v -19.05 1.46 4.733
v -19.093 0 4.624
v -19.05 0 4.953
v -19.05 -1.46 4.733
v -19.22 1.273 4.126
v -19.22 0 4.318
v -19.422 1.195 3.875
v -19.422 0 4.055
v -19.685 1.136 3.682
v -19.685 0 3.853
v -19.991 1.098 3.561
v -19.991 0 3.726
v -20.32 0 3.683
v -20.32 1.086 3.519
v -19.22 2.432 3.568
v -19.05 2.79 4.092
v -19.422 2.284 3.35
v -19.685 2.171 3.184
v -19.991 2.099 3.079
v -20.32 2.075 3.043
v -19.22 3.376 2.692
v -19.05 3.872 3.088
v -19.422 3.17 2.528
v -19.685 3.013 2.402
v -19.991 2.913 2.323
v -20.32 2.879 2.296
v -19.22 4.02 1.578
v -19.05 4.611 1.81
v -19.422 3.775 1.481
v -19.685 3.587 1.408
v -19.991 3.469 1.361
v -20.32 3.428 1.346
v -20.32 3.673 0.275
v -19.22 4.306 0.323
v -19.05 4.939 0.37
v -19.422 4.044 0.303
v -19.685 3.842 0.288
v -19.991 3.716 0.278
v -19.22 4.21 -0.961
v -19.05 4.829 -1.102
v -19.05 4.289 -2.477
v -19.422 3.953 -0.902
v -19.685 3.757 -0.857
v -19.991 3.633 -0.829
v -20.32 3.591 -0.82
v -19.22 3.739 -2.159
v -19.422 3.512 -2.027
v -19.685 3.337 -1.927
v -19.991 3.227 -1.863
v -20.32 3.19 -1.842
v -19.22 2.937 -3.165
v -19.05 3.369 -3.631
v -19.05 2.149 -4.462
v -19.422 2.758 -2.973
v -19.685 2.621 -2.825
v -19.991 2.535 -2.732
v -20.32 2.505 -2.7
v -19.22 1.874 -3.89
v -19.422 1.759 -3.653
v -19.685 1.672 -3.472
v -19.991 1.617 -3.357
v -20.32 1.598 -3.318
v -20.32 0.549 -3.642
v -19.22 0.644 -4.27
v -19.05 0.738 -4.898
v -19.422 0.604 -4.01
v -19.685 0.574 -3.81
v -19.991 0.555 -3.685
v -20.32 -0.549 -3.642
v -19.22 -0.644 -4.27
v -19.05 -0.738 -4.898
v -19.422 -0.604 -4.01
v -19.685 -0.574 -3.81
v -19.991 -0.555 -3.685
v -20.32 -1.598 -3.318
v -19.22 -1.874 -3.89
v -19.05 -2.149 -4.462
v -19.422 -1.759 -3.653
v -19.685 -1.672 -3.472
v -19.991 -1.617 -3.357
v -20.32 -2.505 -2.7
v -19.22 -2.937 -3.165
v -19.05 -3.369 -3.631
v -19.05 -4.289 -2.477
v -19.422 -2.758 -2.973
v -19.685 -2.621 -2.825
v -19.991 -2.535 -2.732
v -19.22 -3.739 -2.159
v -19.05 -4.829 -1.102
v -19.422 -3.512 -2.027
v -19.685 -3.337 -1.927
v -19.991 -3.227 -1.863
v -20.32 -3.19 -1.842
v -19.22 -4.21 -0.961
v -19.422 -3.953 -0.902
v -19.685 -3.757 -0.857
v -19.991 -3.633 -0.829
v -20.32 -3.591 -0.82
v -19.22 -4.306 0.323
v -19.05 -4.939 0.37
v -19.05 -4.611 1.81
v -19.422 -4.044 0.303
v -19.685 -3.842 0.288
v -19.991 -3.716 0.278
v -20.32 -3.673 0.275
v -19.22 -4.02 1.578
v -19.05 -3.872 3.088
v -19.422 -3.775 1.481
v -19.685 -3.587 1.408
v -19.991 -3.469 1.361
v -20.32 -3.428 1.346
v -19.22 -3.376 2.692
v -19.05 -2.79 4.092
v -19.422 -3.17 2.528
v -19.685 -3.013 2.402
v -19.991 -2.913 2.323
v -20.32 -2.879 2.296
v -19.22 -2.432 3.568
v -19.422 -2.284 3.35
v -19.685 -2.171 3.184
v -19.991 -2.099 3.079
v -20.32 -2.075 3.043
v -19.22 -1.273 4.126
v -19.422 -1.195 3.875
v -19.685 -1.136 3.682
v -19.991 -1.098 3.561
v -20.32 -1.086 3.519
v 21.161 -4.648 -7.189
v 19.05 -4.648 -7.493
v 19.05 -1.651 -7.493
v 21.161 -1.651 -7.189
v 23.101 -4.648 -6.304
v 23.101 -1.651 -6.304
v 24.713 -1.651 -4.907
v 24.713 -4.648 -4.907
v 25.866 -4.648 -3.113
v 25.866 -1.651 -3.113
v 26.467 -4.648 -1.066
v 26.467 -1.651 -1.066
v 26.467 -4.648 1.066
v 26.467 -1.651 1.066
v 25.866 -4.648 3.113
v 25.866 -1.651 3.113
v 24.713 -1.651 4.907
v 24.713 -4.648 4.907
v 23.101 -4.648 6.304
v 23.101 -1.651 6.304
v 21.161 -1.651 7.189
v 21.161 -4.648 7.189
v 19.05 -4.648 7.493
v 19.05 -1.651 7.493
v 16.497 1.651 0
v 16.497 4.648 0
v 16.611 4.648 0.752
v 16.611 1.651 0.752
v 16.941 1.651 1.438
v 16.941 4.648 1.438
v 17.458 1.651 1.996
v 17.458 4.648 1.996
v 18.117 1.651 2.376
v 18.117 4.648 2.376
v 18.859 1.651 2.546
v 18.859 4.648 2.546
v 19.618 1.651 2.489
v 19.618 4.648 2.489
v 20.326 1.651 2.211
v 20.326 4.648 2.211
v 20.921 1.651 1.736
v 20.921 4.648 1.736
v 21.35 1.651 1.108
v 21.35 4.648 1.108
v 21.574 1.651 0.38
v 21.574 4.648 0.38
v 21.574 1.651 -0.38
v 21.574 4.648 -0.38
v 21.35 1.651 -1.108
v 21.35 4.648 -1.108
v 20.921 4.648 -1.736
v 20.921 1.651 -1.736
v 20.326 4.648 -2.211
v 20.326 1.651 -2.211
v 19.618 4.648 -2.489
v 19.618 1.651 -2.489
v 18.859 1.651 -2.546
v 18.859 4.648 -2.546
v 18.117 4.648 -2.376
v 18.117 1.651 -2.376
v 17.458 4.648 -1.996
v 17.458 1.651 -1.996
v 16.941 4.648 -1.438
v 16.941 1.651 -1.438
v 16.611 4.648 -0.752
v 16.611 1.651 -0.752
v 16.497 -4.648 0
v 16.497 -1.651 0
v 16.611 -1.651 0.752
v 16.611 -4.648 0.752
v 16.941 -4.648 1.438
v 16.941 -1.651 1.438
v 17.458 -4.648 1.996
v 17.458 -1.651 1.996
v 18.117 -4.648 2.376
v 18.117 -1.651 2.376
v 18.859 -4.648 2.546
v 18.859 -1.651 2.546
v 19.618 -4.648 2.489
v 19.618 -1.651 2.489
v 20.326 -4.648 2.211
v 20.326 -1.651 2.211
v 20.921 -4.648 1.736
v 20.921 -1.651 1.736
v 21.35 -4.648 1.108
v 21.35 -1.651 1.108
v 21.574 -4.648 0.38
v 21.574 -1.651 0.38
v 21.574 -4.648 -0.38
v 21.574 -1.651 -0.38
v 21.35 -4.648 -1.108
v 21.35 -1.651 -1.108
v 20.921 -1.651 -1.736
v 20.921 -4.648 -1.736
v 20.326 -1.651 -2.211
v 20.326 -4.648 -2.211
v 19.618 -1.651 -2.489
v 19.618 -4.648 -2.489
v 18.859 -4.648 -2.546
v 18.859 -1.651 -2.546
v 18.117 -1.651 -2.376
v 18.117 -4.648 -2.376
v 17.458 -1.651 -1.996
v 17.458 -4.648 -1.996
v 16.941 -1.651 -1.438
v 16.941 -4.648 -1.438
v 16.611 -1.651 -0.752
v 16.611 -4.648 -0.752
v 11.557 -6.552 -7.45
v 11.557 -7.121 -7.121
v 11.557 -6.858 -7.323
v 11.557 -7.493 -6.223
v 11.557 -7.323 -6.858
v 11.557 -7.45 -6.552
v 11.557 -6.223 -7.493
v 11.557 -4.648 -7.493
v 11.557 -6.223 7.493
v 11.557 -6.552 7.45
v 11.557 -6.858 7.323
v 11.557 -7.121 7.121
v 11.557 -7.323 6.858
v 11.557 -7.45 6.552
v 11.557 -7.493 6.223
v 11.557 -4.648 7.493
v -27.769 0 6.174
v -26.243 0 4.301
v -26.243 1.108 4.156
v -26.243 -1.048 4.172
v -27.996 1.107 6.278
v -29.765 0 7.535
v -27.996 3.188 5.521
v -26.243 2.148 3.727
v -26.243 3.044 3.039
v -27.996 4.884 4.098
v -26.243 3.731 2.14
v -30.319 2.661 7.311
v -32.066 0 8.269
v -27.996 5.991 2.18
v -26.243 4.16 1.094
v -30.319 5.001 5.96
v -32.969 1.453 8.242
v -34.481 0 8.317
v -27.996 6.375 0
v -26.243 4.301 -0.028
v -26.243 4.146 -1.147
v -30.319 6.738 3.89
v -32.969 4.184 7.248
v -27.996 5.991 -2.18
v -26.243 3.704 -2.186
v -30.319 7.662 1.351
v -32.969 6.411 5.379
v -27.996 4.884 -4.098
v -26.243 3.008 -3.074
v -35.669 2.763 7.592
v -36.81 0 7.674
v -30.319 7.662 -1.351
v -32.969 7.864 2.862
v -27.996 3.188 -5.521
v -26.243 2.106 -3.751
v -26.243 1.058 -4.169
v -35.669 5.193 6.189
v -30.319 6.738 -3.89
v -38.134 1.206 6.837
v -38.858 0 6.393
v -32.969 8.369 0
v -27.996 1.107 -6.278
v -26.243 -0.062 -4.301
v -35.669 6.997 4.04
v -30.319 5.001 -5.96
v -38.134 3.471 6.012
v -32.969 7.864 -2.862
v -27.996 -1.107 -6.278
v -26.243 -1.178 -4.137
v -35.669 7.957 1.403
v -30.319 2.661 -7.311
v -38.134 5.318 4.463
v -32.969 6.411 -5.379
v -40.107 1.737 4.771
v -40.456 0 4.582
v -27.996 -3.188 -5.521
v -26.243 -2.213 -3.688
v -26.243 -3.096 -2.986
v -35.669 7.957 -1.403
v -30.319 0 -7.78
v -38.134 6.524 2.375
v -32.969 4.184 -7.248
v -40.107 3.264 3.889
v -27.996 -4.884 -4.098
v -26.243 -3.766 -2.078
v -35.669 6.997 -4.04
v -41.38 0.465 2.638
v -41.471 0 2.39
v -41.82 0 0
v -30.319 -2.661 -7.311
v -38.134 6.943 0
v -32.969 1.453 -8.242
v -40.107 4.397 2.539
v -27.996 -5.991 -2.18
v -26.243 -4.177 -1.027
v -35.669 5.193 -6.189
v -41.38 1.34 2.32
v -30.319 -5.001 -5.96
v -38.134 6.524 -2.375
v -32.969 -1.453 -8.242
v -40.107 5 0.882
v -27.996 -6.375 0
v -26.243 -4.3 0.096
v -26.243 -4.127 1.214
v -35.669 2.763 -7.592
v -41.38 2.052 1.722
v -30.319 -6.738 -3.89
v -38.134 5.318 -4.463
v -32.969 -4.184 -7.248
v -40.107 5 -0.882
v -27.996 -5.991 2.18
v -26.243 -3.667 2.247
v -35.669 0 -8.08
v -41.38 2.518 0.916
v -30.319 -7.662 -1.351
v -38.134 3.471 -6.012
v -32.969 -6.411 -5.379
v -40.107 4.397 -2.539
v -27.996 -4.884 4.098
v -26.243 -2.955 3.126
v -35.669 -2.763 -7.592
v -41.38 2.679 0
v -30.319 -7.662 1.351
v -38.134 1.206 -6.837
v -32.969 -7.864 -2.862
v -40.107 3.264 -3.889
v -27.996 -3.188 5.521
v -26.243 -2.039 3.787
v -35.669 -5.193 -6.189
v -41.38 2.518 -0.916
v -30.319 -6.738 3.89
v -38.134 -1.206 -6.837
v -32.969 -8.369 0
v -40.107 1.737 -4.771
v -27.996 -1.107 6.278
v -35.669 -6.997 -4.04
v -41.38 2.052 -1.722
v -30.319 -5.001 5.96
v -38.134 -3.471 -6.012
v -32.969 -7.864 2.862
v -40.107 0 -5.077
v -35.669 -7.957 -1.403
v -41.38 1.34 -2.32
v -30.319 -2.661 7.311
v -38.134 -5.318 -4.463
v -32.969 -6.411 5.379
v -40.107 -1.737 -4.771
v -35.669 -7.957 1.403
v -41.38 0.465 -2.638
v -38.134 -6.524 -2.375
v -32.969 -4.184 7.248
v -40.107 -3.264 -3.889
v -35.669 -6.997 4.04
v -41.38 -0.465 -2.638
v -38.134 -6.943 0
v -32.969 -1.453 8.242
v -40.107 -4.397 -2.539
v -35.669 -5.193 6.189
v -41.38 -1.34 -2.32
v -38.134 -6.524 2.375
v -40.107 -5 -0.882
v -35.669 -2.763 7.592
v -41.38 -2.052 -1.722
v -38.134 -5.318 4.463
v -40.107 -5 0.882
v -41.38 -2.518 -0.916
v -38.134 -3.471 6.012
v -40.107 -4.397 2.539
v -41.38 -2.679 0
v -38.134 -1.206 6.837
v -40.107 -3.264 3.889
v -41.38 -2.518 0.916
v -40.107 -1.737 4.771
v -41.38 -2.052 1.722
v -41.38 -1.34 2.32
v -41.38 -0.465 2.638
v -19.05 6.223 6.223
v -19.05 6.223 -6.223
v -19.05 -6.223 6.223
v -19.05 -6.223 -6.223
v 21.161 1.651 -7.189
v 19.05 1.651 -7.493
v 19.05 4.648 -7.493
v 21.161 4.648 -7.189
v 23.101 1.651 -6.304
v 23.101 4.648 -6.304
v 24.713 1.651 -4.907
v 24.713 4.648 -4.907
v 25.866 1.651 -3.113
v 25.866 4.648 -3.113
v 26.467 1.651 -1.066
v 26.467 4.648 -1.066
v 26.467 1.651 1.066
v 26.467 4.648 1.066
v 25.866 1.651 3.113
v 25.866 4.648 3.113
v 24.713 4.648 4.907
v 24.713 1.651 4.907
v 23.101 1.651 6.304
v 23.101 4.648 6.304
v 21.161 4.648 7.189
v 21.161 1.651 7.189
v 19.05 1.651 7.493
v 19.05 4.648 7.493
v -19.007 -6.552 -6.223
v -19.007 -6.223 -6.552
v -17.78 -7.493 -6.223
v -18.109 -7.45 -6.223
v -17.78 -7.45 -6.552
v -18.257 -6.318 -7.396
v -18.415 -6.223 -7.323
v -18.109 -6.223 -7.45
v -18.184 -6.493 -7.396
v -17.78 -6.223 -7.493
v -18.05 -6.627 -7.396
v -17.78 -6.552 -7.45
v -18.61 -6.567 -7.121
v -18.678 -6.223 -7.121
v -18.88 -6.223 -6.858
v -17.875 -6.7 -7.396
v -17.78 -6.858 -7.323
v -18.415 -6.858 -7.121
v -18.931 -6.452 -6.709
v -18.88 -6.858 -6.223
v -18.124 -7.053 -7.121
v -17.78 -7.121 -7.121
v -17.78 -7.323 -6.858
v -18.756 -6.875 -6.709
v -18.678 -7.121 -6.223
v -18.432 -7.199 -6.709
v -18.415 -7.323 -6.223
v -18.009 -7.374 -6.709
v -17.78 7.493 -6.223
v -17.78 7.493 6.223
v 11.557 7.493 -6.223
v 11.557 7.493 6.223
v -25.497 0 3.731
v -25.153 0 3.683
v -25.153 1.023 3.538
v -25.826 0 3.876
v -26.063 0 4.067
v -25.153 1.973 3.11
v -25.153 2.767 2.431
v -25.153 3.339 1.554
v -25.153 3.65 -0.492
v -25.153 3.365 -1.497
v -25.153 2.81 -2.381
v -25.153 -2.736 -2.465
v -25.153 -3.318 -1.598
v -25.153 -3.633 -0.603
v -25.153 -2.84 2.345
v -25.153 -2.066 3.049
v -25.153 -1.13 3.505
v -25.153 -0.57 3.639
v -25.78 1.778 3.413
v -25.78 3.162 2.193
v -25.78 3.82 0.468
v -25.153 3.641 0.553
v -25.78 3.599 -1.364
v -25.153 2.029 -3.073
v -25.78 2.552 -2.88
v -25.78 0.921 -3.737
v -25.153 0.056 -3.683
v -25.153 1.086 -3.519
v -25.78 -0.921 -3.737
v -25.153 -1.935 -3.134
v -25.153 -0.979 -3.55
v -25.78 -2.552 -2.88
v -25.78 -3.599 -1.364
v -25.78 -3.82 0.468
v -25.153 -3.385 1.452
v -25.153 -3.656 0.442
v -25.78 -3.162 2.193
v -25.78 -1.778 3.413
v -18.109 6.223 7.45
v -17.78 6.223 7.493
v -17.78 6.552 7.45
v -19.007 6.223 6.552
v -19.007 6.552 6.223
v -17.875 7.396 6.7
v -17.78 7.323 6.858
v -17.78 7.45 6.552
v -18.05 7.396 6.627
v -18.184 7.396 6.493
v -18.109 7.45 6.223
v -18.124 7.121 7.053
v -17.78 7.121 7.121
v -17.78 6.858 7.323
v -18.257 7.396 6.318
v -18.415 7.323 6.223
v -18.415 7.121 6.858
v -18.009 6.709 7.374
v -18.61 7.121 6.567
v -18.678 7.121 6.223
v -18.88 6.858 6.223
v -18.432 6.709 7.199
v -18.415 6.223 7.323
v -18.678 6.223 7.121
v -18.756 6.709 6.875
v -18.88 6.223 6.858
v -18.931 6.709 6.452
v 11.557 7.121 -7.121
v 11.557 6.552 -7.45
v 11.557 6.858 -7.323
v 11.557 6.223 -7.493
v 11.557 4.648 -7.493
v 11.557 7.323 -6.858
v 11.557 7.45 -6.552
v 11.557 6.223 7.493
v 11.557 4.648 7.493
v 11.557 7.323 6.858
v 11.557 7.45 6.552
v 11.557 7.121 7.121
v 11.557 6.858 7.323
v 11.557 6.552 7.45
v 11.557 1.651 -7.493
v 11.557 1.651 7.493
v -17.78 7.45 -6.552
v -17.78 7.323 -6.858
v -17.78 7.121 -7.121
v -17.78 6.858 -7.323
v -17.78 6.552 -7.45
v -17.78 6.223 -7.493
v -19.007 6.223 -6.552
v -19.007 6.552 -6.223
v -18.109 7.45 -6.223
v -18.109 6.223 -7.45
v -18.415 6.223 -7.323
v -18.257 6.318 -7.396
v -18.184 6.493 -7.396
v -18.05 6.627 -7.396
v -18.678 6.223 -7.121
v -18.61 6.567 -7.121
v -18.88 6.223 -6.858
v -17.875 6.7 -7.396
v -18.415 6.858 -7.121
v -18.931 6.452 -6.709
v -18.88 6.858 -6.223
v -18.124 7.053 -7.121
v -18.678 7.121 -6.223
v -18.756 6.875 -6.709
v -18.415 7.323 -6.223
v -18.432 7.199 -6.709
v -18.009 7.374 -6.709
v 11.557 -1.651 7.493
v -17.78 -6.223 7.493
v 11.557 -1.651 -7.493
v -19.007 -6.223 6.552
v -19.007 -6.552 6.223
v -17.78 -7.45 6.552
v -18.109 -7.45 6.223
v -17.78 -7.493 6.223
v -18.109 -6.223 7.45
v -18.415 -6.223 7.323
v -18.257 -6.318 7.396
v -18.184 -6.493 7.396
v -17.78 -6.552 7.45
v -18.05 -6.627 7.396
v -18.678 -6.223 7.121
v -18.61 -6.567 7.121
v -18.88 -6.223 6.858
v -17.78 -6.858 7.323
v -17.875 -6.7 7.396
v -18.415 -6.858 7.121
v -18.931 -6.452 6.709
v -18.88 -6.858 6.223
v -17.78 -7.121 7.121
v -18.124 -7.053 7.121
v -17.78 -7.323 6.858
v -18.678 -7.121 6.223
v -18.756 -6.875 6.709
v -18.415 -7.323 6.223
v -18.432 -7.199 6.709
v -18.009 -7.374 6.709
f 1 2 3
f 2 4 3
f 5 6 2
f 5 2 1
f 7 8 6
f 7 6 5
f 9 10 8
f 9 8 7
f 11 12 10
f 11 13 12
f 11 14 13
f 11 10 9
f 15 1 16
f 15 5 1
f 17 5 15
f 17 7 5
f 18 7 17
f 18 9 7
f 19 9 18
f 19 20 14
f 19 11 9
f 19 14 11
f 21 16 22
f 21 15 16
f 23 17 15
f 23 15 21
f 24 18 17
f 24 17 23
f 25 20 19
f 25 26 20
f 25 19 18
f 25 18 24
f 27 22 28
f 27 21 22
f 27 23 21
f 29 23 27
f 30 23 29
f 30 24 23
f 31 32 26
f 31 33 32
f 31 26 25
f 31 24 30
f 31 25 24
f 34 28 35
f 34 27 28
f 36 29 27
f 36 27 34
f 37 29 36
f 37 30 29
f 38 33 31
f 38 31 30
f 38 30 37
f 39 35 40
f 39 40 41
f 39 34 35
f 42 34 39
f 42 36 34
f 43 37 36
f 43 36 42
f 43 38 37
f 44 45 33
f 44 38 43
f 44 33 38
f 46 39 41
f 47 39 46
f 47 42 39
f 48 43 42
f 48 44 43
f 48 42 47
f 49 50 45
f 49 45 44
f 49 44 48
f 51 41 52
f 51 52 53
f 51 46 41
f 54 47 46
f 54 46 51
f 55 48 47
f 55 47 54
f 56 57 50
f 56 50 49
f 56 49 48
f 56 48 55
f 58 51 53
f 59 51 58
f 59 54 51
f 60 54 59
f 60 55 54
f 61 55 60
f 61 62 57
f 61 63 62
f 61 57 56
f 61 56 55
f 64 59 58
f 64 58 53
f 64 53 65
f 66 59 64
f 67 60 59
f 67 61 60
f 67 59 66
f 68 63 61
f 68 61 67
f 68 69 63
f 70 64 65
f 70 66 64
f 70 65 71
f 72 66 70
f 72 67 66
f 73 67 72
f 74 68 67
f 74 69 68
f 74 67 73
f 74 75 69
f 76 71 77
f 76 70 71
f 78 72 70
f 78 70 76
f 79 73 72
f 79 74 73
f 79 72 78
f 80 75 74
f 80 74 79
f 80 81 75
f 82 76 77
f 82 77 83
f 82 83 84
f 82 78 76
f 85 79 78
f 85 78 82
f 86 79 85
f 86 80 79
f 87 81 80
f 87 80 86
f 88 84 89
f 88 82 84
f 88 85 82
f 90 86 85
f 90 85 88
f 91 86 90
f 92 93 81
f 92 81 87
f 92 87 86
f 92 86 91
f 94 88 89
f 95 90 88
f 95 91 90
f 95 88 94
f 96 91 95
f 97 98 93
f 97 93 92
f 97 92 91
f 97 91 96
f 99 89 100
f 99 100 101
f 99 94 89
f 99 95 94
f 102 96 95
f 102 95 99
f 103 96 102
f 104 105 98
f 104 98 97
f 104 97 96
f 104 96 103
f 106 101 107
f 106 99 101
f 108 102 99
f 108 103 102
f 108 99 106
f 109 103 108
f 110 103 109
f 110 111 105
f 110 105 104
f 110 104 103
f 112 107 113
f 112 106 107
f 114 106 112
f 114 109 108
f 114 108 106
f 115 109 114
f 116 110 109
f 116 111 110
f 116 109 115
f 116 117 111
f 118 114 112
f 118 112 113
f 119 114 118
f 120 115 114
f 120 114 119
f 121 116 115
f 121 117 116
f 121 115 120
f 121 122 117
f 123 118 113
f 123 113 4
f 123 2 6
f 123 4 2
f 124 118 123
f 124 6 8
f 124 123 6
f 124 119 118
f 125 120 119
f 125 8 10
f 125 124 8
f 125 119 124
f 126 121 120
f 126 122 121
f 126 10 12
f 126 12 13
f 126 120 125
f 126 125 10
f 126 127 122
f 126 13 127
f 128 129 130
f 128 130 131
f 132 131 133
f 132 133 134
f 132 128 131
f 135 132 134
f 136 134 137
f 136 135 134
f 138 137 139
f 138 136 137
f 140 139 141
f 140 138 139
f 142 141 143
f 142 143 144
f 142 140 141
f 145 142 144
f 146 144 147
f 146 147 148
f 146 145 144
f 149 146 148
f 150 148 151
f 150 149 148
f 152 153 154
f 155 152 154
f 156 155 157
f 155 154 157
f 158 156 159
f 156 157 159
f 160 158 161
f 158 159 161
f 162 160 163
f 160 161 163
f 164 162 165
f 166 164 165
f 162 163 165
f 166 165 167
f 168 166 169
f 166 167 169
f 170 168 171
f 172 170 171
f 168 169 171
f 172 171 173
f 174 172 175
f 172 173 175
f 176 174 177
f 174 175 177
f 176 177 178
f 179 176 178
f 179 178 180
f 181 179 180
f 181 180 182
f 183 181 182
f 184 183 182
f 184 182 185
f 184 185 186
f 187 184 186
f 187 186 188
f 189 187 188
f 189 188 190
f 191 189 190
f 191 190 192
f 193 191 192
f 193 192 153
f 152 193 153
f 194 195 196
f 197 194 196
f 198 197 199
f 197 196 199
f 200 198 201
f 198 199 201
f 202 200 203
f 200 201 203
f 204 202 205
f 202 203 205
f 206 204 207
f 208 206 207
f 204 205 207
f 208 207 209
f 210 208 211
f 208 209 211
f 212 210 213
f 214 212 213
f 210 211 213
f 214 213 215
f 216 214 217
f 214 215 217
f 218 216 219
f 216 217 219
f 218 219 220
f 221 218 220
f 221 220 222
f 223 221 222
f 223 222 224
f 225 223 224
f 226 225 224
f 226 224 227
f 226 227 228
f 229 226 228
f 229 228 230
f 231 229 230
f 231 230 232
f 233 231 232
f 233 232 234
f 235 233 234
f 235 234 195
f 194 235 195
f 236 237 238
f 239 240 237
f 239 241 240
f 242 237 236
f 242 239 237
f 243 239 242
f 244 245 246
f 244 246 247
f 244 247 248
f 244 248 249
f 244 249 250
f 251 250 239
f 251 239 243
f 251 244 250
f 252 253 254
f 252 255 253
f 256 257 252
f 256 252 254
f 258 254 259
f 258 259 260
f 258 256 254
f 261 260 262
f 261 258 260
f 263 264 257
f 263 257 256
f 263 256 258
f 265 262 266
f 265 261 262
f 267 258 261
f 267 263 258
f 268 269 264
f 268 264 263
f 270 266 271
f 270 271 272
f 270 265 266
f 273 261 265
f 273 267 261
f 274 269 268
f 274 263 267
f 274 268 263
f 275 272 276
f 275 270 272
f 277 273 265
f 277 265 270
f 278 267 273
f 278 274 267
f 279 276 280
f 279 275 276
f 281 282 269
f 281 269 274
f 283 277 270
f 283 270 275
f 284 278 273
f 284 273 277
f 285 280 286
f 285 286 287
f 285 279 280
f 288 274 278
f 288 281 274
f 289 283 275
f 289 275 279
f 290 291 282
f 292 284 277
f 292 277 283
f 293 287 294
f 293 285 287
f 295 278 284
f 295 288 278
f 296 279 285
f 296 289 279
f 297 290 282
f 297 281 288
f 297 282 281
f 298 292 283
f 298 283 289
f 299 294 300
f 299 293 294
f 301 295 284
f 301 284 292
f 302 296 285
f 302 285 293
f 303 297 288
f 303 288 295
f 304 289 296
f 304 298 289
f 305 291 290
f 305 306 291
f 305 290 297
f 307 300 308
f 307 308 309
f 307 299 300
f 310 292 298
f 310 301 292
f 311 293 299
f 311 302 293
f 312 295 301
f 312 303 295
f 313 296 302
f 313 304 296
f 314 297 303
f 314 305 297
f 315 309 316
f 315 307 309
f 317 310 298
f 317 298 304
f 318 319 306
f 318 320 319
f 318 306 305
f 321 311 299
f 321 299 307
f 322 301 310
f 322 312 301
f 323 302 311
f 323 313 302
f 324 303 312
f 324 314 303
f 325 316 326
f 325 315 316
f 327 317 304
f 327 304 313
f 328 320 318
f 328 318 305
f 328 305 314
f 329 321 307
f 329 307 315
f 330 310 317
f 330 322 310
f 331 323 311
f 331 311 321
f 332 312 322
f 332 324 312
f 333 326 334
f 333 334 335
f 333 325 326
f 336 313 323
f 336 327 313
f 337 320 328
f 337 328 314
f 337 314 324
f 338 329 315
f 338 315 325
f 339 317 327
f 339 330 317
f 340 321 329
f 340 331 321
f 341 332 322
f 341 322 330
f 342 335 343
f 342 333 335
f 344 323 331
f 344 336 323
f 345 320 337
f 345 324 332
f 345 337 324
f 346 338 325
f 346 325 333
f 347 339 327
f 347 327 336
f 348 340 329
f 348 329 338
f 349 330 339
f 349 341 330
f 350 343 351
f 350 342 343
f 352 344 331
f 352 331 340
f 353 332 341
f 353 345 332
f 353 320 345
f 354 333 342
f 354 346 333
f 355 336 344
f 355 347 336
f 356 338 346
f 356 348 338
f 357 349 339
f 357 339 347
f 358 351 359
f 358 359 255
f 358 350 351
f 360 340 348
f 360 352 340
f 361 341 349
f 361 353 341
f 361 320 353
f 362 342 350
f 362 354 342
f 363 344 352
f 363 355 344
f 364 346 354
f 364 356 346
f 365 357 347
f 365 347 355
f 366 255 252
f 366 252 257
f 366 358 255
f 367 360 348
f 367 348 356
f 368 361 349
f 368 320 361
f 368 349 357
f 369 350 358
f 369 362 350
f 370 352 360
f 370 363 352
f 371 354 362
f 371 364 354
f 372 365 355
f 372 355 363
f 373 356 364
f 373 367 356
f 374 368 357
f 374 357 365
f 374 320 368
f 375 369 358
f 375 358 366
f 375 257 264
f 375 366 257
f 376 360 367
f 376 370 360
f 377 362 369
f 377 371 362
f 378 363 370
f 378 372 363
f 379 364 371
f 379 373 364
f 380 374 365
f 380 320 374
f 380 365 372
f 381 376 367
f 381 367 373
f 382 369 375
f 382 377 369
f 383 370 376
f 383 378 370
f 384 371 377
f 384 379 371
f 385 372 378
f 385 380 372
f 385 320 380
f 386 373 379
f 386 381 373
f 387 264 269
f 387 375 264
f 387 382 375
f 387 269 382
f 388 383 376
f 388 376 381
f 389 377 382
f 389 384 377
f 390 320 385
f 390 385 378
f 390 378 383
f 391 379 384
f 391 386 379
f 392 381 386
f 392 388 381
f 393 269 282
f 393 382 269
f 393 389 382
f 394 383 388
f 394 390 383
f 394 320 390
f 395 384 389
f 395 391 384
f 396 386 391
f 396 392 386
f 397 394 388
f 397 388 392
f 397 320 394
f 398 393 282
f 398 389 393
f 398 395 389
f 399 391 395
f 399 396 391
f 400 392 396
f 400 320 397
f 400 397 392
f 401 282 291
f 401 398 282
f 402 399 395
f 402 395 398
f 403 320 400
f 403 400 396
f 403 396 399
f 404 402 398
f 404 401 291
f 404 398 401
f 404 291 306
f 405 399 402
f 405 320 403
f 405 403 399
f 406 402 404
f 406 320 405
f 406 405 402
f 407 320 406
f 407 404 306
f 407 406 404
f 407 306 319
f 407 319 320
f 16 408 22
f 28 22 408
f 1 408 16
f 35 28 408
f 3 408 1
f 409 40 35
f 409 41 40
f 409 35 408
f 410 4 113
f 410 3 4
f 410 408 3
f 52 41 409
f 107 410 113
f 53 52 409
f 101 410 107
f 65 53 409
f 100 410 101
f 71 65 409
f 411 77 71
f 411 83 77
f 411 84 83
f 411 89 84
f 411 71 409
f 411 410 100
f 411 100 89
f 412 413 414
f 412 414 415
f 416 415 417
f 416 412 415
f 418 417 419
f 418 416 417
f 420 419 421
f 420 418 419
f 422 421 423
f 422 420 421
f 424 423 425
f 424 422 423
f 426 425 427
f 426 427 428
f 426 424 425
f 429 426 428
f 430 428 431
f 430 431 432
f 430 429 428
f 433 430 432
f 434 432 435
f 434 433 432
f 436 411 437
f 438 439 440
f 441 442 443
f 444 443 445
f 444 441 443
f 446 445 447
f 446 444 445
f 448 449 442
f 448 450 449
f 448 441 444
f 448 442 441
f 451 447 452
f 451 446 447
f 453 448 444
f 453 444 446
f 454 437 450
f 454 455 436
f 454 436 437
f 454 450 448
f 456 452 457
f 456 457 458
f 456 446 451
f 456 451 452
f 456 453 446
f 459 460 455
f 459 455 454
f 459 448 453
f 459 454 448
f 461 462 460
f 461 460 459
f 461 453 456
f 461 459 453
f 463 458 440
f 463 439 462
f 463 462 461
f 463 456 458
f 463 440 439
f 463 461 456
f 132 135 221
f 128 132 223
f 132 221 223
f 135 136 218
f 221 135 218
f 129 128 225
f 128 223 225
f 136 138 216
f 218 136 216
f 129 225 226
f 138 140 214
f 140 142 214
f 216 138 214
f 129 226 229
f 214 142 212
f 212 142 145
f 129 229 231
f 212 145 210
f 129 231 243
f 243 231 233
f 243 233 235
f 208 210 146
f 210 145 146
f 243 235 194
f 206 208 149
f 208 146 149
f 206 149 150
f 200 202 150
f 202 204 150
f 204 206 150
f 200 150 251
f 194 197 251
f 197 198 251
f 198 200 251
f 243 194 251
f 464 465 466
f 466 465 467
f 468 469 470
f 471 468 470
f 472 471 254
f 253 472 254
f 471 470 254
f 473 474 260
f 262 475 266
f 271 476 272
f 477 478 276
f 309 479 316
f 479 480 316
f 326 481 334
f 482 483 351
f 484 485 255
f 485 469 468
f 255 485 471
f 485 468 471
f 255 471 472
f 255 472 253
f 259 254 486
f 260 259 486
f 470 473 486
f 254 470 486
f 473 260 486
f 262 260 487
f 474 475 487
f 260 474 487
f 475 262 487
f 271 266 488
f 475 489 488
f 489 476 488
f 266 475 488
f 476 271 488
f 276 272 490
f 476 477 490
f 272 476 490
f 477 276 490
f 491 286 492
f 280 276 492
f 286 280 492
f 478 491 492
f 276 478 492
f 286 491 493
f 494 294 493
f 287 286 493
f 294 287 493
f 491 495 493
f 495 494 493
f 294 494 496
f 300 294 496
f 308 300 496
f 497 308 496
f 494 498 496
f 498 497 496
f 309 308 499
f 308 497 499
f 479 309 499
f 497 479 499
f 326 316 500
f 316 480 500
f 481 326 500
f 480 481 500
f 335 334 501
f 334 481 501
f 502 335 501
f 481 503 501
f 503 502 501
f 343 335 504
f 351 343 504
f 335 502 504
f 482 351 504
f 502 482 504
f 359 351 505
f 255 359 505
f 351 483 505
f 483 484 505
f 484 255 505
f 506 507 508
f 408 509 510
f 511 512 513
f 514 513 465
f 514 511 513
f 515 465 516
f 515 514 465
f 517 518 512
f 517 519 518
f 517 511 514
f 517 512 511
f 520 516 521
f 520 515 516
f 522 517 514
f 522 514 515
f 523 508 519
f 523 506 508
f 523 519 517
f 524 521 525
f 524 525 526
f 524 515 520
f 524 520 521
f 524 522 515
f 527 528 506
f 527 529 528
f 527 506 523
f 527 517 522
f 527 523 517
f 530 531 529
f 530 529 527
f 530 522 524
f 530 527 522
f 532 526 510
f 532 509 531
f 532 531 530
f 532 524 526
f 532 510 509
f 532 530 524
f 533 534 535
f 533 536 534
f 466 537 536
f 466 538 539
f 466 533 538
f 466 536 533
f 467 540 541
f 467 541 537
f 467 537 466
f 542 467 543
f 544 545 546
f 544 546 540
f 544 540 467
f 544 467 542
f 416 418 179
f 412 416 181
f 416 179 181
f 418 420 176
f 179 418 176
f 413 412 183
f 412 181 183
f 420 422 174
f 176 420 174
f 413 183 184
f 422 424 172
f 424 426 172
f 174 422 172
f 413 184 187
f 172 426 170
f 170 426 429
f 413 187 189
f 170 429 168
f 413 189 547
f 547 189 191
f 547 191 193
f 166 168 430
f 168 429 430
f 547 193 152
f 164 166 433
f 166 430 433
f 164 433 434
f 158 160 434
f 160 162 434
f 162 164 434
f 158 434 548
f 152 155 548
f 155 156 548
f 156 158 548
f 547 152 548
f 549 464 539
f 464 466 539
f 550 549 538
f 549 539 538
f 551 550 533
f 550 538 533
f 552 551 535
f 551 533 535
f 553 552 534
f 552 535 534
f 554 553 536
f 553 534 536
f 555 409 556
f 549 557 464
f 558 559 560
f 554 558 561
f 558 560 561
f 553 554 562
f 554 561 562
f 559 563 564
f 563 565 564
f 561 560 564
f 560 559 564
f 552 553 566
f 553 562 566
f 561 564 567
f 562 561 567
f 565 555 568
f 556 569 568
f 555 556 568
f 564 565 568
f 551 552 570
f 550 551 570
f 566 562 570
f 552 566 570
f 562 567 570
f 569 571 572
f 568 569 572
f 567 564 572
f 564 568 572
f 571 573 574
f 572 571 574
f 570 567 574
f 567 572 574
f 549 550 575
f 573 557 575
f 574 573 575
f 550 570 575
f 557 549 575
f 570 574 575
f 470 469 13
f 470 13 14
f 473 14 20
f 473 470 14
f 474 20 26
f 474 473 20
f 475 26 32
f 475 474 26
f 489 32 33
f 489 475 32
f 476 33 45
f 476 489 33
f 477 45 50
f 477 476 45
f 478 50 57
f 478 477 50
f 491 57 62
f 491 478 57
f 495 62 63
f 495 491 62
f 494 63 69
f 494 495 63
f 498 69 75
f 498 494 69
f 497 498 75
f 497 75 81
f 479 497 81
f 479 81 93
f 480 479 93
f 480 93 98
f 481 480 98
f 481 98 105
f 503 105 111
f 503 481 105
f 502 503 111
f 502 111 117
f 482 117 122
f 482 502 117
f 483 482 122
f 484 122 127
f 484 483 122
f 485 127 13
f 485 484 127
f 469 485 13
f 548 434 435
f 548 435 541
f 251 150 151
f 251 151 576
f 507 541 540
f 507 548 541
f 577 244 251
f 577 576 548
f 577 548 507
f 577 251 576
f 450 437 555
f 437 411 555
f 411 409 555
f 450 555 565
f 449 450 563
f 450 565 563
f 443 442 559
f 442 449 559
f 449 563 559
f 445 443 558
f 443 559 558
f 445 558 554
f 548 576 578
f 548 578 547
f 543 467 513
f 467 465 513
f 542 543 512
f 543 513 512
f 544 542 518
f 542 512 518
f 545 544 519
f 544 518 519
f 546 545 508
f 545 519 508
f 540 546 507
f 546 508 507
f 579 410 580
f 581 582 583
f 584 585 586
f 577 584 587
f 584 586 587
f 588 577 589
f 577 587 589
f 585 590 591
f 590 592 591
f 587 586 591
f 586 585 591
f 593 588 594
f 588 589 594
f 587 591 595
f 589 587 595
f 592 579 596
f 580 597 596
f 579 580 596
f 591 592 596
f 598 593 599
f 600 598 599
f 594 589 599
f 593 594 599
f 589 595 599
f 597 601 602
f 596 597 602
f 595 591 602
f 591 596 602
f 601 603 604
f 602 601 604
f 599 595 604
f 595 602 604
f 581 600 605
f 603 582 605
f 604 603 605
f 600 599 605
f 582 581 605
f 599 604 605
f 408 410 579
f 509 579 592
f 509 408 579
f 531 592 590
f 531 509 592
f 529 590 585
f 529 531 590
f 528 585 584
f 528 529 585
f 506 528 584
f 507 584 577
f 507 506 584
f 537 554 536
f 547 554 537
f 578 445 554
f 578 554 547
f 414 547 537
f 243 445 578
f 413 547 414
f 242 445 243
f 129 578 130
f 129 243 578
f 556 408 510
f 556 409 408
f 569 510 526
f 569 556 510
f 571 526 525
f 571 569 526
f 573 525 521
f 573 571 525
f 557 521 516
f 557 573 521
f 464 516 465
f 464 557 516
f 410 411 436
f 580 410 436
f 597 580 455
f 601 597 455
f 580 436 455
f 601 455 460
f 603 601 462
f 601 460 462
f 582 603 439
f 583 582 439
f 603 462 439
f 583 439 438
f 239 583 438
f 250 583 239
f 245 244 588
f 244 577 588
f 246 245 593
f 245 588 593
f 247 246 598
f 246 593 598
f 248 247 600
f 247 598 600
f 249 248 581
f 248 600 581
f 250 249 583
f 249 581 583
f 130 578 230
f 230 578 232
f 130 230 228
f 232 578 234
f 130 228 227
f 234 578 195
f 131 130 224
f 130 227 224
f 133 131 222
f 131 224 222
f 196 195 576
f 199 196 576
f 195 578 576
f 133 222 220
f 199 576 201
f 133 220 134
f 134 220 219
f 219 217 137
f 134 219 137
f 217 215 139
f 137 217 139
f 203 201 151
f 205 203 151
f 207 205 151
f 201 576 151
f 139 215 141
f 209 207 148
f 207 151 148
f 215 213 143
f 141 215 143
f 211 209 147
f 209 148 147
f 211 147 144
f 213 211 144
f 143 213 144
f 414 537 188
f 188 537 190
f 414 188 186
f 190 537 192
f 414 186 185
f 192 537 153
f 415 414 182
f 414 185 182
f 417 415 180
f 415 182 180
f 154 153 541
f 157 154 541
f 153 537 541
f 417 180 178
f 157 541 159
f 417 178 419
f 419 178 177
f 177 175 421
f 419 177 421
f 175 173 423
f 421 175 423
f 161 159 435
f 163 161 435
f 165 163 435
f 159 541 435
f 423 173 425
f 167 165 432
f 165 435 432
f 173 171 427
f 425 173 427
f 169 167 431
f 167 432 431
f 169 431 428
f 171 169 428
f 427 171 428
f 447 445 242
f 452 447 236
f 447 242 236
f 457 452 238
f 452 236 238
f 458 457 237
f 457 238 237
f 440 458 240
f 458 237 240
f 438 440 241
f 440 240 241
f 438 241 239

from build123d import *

# Parameters (mm, degrees)
F1_DEPTH      = 7.493
F1_DEPTH_BACK = 7.493
F3_D          = 5.1054
F4_W          = 7.493
F4_H          = 2.8448
F4_H_2        = 3.302
F5_DEPTH      = 25.4
F8_R          = 1.27
F9_R          = 1.27


with BuildPart() as f1:
    # F0 (on Front) → F1 (new body, two sides)
    with BuildSketch(Plane.XZ) as f1_sk:
        with BuildLine():
            Line((-19.05, -7.493), (19.05, -7.493))
            ThreePointArc((19.05, -7.493), (11.557, 0), (19.05, 7.493))
            Line((19.05, 7.493), (-19.05, 7.493))
            Line((-19.05, 7.493), (-19.05, -7.493))
        make_face()
        with BuildLine():
            ThreePointArc((19.05, 7.493), (11.557, 0), (19.05, -7.493))
            Line((19.05, -7.493), (19.05, 7.493))
        make_face()
        with BuildLine():
            Line((19.05, 7.493), (19.05, -7.493))
            ThreePointArc((19.05, -7.493), (24.3483511114, -5.2983511114), (26.543, 0))
            ThreePointArc((26.543, 0), (24.3483511114, 5.2983511114), (19.05, 7.493))
        make_face()
    extrude(amount=F1_DEPTH)
    extrude(f1_sk.sketch, amount=-F1_DEPTH_BACK)

    # F3 (through all)
    with Locations(Plane.XZ.offset(7.493)):
        with Locations((19.05, 0)):
            Hole(F3_D / 2)

    # F4 (on face) → F5 (cut)
    with BuildSketch(Plane.XY.offset(7.493)):
        with Locations((15.3035, 6.0706)):
            Rectangle(F4_W, F4_H)
        with Locations((22.7965, 6.0706)):
            Rectangle(F4_W, F4_H)
        with Locations((22.7965, 0)):
            Rectangle(F4_W, F4_H_2)
        with Locations((15.3035, 0)):
            Rectangle(F4_W, F4_H_2)
        with Locations((15.3035, -6.0706)):
            Rectangle(F4_W, F4_H)
        with Locations((22.7965, -6.0706)):
            Rectangle(F4_W, F4_H)
    extrude(amount=-F5_DEPTH, mode=Mode.SUBTRACT)

    # F6 (on Front) → F7 (revolve)
    with BuildSketch(Plane.XZ):
        with BuildLine():
            Line((-41.8195042998, 0), (-25.0555042998, 0))
            ThreePointArc((-25.0555042998, 0), (-25.2714088729, 1.8901876837), (-25.908, 3.683))
            ThreePointArc((-25.908, 3.683), (-35.3276919835, 8.1660954268), (-41.8195042998, 0))
        make_face()
        with BuildLine():
            Line((-25.0555042998, 0), (-19.05, 0))
            Line((-19.05, 0), (-19.05, 3.683))
            Line((-19.05, 3.683), (-25.908, 3.683))
            ThreePointArc((-25.908, 3.683), (-25.2714088729, 1.8901876837), (-25.0555042998, 0))
        make_face()
    revolve(axis=Axis((-30.4347521499, 0, 0), (-1, 0, 0)))

    # F8
    f8_edges = [f1.edges().sort_by_distance(p)[0] for p in [
        (-25.908, 0, -3.683),
        (-19.05, 0, -3.683),
    ]]
    fillet(f8_edges, radius=F8_R)

    # F9
    f9_edges = [f1.edges().sort_by_distance(p)[0] for p in [
        (-19.05, -7.493, 0),
        (-19.05, 0, 7.493),
        (-3.7465, -7.493, 7.493),
        (-3.7465, 7.493, 7.493),
        (-19.05, 7.493, 0),
        (-19.05, 0, -7.493),
        (-3.7465, 7.493, -7.493),
        (-3.7465, -7.493, -7.493),
    ]]
    fillet(f9_edges, radius=F9_R)


solid = f1.part
